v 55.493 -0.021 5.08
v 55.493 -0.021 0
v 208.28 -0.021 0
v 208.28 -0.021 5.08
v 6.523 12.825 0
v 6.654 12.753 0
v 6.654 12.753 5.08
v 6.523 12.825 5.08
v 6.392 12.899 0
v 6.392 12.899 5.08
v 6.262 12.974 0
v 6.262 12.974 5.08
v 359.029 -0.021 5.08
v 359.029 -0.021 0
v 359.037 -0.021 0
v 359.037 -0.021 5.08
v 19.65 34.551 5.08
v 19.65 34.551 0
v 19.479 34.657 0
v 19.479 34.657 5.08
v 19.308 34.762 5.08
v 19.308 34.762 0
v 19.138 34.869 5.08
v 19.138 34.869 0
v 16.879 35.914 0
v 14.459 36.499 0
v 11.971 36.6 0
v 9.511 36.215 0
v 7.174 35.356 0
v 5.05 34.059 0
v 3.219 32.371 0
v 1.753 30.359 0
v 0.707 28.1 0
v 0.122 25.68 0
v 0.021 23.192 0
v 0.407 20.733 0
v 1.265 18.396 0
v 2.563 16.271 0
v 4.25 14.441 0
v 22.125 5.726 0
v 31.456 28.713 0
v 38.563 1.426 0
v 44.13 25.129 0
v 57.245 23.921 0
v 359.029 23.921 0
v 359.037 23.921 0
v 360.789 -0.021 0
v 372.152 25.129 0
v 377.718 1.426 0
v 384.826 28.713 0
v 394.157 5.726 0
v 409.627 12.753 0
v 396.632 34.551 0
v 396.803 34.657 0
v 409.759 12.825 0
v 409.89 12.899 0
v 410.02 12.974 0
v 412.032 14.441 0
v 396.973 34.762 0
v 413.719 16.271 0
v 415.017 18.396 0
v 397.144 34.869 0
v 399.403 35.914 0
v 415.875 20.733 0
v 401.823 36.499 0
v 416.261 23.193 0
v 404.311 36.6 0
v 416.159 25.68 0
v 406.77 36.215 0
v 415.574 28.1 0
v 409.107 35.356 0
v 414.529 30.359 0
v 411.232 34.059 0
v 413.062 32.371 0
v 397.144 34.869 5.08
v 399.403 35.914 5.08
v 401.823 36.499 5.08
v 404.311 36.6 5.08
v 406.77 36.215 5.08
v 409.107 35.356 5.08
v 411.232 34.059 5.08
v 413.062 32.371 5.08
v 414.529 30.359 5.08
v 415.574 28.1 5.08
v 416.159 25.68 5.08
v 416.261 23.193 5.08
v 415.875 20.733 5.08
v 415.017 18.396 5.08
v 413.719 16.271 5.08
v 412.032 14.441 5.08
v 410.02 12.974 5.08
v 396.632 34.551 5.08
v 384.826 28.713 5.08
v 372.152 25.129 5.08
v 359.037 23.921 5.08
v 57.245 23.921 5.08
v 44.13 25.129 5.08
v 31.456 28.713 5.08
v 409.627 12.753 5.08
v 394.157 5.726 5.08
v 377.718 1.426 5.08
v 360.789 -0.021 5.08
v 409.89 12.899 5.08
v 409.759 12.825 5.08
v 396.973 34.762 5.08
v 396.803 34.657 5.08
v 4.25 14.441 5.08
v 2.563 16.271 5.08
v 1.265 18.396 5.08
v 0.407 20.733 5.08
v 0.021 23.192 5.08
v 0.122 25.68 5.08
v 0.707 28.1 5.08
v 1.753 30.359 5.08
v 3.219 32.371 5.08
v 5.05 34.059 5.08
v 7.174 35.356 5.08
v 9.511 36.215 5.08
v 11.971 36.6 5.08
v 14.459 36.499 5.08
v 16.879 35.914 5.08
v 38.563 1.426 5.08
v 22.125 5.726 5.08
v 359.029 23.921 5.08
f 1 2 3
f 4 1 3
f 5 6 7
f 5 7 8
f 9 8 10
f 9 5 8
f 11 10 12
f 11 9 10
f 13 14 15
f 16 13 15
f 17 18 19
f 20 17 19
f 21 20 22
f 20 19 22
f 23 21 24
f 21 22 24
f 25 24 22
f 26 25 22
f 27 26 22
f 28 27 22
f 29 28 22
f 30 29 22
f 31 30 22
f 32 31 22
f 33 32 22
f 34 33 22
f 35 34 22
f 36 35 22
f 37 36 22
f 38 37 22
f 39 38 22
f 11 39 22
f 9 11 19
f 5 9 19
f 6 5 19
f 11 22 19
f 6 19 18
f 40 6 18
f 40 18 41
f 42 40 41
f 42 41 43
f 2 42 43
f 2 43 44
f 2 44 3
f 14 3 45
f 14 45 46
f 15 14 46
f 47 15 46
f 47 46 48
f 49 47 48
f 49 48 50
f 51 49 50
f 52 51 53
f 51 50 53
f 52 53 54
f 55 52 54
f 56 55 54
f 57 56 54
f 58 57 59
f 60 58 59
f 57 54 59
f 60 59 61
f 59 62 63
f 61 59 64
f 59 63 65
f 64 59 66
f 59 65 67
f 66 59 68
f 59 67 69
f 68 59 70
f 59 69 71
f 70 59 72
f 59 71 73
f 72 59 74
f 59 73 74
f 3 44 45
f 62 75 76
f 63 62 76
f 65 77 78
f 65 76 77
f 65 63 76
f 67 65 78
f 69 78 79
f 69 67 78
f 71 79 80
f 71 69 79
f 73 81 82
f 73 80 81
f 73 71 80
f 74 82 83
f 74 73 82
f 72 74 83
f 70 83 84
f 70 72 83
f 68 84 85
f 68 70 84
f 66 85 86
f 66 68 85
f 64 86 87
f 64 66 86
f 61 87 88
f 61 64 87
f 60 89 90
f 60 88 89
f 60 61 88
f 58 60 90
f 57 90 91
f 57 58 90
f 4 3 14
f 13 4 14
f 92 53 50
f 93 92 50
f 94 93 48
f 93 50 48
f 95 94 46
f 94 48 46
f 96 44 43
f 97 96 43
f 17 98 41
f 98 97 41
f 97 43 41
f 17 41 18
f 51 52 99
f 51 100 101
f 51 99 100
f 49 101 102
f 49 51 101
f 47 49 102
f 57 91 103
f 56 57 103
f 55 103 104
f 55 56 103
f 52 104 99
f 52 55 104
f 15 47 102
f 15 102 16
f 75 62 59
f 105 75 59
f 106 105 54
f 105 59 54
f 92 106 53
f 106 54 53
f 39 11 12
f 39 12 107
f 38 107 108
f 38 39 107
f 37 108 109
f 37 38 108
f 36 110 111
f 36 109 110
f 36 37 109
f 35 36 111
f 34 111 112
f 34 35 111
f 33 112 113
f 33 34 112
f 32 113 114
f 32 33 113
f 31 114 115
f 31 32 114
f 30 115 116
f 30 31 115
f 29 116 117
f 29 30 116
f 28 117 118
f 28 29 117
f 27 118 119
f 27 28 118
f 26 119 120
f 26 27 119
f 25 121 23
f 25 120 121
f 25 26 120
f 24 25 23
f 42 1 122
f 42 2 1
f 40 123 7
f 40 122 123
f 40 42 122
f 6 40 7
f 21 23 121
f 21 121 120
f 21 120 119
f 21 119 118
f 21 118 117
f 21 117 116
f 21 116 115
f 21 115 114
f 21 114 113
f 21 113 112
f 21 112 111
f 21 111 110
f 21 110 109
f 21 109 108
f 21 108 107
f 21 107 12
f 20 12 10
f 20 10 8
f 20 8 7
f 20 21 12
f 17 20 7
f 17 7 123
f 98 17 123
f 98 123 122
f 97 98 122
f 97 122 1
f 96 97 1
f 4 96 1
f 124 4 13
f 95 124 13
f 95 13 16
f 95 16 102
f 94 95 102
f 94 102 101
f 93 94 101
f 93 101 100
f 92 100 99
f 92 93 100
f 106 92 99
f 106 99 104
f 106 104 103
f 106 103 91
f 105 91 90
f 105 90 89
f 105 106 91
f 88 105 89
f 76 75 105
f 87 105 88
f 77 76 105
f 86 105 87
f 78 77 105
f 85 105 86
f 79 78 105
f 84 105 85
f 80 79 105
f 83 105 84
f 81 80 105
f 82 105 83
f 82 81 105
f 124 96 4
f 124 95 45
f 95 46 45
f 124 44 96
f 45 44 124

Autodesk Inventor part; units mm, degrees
ref_plane "YZ Plane" through (0, 0, 0) normal (1, 0, 0) x (0, 1, 0)
ref_plane "XZ Plane" through (0, 0, 0) normal (0, 1, 0) x (-1, 0, 0)
ref_plane "XY Plane" through (0, 0, 0) normal (0, 0, 1) x (1, 0, 0)
sketch "Sketch1" plane through (0, 0, 0) normal (0, 0, 1) x (1, 0, 0)
  line L0 (55.4931, -0.0207) -> (359.029, -0.0207)
  line L1 (208.28, -0.0207) -> (55.4931, -0.0207)
  line L2 (208.28, -0.0207) -> (359.029, -0.0207)
  line L3 (57.245, 23.9209) -> (359.029, 23.9209)
  line L4 (208.28, -0.0207) -> (359.029, -0.0207)
  line L5 (55.4931, -0.0207) -> (359.0367, -0.0207)
  line L6 (359.0367, 23.9209) -> (57.245, 23.9209)
  arc A0 (19.6495, 34.5513) -> (6.6543, 12.7528) centre (12.7, 23.9214) ccw
  arc A1 (19.138, 34.8687) -> (57.245, 23.9209) centre (57.245, 95.7161) ccw
  arc A2 (6.262, 12.9742) -> (55.4931, -0.0207) centre (55.4931, 99.7327) ccw
  arc A3 (409.6274, 12.7528) -> (396.6322, 34.5513) centre (403.5817, 23.9214) ccw
  arc A4 (359.0367, 23.9209) -> (397.1436, 34.8687) centre (359.0367, 95.7161) ccw
  arc A5 (360.7886, -0.0207) -> (410.0197, 12.9742) centre (360.7886, 99.7327) ccw
  line L7 (360.7886, -0.0207) -> (55.4931, -0.0207)
  point P0 (0, 0)
  point P1 (416.2817, 0)
extrude "Extrusion1" add sketch "Sketch1" along normal blind 5.08 contours A2 A0 A1 L3 L6 A4 A3 A5 L7 L5 L0
properties part number "bottomSkid"
